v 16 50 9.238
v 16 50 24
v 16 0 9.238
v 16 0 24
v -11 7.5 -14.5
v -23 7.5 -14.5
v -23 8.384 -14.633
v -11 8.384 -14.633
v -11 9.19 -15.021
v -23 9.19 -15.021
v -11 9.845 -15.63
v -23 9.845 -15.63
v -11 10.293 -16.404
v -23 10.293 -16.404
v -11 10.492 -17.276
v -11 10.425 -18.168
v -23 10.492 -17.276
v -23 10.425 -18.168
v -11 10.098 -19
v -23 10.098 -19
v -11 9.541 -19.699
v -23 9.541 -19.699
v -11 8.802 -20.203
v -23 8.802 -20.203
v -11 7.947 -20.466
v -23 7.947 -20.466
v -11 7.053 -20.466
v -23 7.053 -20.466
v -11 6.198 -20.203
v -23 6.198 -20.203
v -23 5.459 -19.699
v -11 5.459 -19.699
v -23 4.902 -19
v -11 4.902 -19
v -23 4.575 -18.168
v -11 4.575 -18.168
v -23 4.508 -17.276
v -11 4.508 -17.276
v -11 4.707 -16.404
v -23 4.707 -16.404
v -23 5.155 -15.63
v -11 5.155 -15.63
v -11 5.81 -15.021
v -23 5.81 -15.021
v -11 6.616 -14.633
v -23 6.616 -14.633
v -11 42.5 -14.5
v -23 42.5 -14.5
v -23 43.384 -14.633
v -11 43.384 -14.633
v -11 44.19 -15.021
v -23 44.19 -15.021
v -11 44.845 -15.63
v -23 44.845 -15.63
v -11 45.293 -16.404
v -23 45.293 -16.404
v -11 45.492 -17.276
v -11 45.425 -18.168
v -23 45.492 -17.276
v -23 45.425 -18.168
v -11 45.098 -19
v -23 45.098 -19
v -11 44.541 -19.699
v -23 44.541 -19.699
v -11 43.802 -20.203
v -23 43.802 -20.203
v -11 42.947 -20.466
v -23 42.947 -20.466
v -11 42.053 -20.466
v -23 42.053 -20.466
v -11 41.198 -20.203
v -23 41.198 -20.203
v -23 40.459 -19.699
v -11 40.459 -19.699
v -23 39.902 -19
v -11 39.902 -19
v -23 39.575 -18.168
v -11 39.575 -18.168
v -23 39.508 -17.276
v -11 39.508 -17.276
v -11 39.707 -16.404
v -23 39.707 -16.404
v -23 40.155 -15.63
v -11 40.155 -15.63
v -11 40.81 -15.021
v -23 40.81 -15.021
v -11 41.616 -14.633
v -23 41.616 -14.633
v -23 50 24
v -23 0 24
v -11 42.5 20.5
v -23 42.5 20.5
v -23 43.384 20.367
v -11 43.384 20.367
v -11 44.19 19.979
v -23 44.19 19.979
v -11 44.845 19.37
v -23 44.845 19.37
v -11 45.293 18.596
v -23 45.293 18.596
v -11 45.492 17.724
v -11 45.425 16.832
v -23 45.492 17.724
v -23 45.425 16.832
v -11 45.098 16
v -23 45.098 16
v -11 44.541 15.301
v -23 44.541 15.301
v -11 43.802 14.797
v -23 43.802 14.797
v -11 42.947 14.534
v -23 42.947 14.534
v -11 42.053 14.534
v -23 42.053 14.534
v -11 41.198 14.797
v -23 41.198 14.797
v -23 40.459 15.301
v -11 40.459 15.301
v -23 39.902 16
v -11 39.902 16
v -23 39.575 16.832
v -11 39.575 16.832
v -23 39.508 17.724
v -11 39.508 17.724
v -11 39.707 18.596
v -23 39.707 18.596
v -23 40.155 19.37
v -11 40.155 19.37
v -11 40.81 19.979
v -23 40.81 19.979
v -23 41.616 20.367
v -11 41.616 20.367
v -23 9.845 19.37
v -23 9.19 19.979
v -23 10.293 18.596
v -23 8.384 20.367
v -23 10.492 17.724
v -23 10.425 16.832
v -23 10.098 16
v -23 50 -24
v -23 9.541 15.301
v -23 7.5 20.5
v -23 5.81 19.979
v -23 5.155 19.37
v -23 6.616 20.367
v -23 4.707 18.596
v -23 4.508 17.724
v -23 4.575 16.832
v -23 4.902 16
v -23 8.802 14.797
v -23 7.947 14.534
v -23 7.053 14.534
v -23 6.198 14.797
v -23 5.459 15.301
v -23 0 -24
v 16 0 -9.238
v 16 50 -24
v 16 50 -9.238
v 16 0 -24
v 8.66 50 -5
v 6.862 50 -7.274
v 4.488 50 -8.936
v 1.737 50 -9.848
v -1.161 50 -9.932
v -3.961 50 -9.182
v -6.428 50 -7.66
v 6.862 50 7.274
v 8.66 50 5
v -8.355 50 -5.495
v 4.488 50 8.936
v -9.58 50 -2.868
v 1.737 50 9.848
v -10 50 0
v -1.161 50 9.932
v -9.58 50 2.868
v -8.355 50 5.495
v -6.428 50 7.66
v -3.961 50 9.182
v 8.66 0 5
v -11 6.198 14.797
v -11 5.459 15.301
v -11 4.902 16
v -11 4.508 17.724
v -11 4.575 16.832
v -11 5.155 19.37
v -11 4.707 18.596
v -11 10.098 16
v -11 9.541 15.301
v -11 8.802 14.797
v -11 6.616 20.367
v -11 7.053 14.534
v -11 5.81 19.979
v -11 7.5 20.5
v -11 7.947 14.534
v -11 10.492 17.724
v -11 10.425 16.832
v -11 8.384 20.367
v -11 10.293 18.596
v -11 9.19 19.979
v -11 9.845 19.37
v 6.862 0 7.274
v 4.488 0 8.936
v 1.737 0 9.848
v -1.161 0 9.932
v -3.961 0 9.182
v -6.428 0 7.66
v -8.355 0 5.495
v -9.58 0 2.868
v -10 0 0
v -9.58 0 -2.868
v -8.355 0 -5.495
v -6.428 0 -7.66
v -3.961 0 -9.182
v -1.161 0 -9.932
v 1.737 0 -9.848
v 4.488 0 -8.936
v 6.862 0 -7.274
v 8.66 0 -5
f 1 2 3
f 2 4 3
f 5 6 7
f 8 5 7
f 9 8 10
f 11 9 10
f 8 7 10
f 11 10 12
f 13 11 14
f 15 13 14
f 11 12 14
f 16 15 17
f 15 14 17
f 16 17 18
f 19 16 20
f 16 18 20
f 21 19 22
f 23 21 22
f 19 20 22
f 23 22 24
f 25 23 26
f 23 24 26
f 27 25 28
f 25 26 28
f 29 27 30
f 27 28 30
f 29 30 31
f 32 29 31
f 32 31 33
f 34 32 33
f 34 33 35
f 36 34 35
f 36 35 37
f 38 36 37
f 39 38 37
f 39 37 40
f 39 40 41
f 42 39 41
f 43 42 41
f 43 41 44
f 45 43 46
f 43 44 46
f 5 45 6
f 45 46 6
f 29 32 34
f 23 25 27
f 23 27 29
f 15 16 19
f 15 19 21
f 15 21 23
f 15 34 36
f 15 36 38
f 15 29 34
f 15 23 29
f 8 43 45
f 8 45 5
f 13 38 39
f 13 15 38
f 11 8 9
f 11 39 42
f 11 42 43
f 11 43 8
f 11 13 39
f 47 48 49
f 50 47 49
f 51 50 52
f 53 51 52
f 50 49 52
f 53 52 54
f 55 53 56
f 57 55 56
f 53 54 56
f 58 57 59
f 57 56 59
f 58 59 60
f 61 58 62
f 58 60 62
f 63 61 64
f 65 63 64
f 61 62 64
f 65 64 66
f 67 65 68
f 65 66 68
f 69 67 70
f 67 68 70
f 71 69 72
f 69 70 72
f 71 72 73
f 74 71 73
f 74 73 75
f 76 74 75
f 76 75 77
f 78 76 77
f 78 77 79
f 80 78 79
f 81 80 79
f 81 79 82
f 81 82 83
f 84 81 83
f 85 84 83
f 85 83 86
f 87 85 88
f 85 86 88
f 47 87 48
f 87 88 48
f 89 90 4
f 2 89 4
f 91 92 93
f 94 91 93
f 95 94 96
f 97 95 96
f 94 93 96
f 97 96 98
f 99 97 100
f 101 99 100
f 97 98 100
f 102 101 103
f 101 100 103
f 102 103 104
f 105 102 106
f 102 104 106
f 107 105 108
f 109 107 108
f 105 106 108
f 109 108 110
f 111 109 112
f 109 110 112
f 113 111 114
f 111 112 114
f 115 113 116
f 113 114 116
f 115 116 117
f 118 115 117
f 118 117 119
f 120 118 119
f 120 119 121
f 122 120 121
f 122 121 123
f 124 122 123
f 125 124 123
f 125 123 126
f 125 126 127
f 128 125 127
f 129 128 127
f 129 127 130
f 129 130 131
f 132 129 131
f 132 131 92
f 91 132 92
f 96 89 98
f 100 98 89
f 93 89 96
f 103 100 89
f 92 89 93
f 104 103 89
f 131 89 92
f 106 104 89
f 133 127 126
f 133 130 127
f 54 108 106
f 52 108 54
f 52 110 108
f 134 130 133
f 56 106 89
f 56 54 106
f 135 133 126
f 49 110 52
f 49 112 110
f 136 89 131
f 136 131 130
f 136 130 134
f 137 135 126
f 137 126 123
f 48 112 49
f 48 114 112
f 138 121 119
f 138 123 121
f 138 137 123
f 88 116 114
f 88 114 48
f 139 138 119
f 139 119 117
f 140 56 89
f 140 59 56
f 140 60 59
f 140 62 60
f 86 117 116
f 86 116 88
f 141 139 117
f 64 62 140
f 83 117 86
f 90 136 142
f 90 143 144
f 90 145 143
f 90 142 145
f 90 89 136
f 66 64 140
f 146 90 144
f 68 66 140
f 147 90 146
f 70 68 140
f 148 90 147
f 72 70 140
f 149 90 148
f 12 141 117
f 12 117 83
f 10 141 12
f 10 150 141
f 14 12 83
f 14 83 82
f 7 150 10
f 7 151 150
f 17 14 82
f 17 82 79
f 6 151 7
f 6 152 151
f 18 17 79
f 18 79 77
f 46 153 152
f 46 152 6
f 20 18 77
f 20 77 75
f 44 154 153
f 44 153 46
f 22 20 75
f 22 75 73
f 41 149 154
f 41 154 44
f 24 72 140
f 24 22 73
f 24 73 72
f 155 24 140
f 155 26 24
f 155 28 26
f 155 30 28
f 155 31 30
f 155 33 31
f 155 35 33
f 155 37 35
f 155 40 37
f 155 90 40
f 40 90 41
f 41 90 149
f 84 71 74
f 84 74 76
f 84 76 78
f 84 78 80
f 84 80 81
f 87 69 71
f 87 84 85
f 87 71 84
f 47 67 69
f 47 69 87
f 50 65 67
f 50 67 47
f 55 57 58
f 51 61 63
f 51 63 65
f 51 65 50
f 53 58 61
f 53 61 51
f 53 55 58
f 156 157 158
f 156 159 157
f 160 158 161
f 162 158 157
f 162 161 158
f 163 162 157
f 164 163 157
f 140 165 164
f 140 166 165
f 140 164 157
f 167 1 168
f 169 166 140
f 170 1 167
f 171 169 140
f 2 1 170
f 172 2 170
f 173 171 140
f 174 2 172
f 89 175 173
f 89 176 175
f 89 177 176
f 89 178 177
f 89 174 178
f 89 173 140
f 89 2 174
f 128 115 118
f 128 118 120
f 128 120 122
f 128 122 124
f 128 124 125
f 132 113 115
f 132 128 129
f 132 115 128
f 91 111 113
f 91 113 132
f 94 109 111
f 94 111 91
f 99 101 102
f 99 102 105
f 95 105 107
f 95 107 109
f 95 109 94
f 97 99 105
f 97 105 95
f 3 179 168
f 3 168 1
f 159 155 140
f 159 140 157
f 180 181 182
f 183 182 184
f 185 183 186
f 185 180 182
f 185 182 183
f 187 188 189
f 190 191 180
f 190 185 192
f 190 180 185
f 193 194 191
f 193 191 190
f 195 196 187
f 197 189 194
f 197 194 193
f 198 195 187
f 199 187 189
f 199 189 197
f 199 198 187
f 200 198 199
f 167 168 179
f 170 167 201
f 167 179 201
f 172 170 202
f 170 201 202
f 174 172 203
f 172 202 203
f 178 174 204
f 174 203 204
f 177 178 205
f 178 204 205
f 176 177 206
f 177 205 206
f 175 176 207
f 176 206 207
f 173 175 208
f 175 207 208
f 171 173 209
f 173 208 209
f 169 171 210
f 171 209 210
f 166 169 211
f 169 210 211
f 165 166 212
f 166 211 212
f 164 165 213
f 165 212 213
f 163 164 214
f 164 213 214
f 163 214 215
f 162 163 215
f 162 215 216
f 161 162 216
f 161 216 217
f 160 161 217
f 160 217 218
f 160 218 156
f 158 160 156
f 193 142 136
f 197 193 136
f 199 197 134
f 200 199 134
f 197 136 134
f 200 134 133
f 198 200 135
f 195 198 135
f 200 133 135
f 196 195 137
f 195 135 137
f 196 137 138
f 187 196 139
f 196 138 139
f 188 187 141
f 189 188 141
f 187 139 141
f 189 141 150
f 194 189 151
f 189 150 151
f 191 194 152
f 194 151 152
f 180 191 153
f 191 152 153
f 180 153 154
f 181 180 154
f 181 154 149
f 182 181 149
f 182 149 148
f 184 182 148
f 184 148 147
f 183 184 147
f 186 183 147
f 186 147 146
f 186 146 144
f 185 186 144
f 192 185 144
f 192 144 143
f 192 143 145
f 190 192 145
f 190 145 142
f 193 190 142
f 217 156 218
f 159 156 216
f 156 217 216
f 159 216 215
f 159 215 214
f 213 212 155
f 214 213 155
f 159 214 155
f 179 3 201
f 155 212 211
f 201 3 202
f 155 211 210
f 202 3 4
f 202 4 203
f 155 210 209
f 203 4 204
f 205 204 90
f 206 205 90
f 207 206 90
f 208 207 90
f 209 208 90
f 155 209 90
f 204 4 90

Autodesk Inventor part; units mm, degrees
ref_plane "YZ Plane" through (0, 0, 0) normal (1, 0, 0) x (0, 1, 0)
ref_plane "XZ Plane" through (0, 0, 0) normal (0, 1, 0) x (-1, 0, 0)
ref_plane "XY Plane" through (0, 0, 0) normal (0, 0, 1) x (1, 0, 0)
sketch "Sketch1" plane through (0, 0, 0) normal (0, 1, 0) x (-1, 0, 0)
  arc A0 (-8.6603, -5) -> (-8.6603, 5) centre (0, 0) ccw
  line L0 (-8.6603, -5) -> (-16, -9.2376)
  line L1 (-8.6603, 5) -> (-16, 9.2376)
  line L2 (0, 0) -> (23, 0)
  line L3 (23, 0) -> (23, -24)
  line L4 (23, 0) -> (23, 24)
  line L5 (23, -24) -> (-16, -24)
  line L6 (-16, -24) -> (-16, -9.2376)
  line L7 (23, 24) -> (-16, 24)
  line L8 (-16, 24) -> (-16, 9.2376)
  dimension "d0" = 20
  dimension "d2" = 23
  dimension "d3" = 24
  dimension "d4" = 24
  dimension "d5" = 39
extrude "Extrusion1" add sketch "Sketch1" along normal blind 50
sketch "Sketch2" plane through (-23, 0, -24) normal (-1, 0, 0) x (0, 0, 1)
  line L0 (48, 0) -> (48, 50) projected
  line L1 (14.7624, 0) -> (0, 0) projected
  line L2 (48, 0) -> (33.2376, 0) projected
  line L3 (14.7624, 50) -> (0, 50) projected
  circle A0 centre (6.5, 42.5) radius 3
  circle A1 centre (6.5, 7.5) radius 3
  circle A2 centre (41.5, 7.5) radius 3
  circle A3 centre (41.5, 42.5) radius 3
  point P0 (24, 0)
  point P1 (24, 25)
  dimension "d10" = 6
  dimension "d11" = 6
  dimension "d12" = 6
  dimension "d13" = 6
extrude "Extrusion2" cut sketch "Sketch2" against normal blind 12
properties part number "Rodamiento lineal"
